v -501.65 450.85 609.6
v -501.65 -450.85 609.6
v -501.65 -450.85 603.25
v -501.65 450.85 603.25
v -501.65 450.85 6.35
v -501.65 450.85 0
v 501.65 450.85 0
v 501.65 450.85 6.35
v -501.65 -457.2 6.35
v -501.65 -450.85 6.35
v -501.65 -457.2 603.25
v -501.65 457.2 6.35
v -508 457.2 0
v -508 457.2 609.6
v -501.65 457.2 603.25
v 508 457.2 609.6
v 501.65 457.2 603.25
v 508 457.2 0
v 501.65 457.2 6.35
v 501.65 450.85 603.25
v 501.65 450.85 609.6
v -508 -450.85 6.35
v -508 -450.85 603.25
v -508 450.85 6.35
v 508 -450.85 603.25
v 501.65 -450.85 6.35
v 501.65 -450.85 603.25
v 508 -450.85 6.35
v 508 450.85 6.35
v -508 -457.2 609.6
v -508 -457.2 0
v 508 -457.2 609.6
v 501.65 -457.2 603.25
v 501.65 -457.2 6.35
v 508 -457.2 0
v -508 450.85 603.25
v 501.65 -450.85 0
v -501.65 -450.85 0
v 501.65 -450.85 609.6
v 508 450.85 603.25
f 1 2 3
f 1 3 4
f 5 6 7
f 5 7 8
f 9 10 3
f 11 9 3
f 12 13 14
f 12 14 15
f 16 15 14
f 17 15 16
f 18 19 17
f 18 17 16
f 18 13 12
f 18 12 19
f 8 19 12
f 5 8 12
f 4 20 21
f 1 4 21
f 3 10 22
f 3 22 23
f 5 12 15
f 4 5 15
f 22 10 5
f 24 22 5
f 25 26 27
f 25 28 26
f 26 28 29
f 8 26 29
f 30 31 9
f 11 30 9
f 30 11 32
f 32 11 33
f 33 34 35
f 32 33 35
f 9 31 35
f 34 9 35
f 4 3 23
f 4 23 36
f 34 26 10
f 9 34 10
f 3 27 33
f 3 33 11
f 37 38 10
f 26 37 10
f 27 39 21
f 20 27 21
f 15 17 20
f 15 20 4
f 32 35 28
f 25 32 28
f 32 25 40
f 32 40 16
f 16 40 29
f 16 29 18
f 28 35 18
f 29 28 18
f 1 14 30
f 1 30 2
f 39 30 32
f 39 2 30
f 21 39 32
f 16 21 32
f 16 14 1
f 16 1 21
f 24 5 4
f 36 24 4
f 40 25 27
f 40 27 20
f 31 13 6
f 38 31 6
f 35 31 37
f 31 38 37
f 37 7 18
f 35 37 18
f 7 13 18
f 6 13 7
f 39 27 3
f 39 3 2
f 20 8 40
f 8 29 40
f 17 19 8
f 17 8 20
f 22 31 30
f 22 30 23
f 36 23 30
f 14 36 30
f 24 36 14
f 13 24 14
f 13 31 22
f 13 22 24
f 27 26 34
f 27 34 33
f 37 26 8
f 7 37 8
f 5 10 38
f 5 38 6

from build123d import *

# Parameters (mm, degrees)
F0_W     = 1016
F0_H     = 914.4
F1_DEPTH = 609.6
F2_W     = 1003.3
F2_H     = 901.7
F3_DEPTH = 609.601
F4_W     = 901.7
F4_H     = 596.9
F5_DEPTH = 1016.001
F6_W     = 1003.3
F6_H     = 596.9
F7_DEPTH = 914.401


with BuildPart() as f1:
    # F0 (on Top) → F1 (new body)
    with BuildSketch(Plane.XY):
        Rectangle(F0_W, F0_H)
    extrude(amount=F1_DEPTH)

    # F2 (on face) → F3 (cut, through all)
    with BuildSketch(Plane.XY.offset(609.6)):
        Rectangle(F2_W, F2_H)
    extrude(amount=-F3_DEPTH, mode=Mode.SUBTRACT)

    # F4 (on face) → F5 (cut, through all)
    with BuildSketch(Plane.YZ.offset(508)):
        with Locations((0, 304.8)):
            Rectangle(F4_W, F4_H)
    extrude(amount=-F5_DEPTH, mode=Mode.SUBTRACT)

    # F6 (on face) → F7 (cut, through all)
    with BuildSketch(Plane(origin=(0, 457.2, 0), x_dir=(-1, 0, 0), z_dir=(0, 1, 0))):
        with Locations((0, 304.8)):
            Rectangle(F6_W, F6_H)
    extrude(amount=-F7_DEPTH, mode=Mode.SUBTRACT)


solid = f1.part
